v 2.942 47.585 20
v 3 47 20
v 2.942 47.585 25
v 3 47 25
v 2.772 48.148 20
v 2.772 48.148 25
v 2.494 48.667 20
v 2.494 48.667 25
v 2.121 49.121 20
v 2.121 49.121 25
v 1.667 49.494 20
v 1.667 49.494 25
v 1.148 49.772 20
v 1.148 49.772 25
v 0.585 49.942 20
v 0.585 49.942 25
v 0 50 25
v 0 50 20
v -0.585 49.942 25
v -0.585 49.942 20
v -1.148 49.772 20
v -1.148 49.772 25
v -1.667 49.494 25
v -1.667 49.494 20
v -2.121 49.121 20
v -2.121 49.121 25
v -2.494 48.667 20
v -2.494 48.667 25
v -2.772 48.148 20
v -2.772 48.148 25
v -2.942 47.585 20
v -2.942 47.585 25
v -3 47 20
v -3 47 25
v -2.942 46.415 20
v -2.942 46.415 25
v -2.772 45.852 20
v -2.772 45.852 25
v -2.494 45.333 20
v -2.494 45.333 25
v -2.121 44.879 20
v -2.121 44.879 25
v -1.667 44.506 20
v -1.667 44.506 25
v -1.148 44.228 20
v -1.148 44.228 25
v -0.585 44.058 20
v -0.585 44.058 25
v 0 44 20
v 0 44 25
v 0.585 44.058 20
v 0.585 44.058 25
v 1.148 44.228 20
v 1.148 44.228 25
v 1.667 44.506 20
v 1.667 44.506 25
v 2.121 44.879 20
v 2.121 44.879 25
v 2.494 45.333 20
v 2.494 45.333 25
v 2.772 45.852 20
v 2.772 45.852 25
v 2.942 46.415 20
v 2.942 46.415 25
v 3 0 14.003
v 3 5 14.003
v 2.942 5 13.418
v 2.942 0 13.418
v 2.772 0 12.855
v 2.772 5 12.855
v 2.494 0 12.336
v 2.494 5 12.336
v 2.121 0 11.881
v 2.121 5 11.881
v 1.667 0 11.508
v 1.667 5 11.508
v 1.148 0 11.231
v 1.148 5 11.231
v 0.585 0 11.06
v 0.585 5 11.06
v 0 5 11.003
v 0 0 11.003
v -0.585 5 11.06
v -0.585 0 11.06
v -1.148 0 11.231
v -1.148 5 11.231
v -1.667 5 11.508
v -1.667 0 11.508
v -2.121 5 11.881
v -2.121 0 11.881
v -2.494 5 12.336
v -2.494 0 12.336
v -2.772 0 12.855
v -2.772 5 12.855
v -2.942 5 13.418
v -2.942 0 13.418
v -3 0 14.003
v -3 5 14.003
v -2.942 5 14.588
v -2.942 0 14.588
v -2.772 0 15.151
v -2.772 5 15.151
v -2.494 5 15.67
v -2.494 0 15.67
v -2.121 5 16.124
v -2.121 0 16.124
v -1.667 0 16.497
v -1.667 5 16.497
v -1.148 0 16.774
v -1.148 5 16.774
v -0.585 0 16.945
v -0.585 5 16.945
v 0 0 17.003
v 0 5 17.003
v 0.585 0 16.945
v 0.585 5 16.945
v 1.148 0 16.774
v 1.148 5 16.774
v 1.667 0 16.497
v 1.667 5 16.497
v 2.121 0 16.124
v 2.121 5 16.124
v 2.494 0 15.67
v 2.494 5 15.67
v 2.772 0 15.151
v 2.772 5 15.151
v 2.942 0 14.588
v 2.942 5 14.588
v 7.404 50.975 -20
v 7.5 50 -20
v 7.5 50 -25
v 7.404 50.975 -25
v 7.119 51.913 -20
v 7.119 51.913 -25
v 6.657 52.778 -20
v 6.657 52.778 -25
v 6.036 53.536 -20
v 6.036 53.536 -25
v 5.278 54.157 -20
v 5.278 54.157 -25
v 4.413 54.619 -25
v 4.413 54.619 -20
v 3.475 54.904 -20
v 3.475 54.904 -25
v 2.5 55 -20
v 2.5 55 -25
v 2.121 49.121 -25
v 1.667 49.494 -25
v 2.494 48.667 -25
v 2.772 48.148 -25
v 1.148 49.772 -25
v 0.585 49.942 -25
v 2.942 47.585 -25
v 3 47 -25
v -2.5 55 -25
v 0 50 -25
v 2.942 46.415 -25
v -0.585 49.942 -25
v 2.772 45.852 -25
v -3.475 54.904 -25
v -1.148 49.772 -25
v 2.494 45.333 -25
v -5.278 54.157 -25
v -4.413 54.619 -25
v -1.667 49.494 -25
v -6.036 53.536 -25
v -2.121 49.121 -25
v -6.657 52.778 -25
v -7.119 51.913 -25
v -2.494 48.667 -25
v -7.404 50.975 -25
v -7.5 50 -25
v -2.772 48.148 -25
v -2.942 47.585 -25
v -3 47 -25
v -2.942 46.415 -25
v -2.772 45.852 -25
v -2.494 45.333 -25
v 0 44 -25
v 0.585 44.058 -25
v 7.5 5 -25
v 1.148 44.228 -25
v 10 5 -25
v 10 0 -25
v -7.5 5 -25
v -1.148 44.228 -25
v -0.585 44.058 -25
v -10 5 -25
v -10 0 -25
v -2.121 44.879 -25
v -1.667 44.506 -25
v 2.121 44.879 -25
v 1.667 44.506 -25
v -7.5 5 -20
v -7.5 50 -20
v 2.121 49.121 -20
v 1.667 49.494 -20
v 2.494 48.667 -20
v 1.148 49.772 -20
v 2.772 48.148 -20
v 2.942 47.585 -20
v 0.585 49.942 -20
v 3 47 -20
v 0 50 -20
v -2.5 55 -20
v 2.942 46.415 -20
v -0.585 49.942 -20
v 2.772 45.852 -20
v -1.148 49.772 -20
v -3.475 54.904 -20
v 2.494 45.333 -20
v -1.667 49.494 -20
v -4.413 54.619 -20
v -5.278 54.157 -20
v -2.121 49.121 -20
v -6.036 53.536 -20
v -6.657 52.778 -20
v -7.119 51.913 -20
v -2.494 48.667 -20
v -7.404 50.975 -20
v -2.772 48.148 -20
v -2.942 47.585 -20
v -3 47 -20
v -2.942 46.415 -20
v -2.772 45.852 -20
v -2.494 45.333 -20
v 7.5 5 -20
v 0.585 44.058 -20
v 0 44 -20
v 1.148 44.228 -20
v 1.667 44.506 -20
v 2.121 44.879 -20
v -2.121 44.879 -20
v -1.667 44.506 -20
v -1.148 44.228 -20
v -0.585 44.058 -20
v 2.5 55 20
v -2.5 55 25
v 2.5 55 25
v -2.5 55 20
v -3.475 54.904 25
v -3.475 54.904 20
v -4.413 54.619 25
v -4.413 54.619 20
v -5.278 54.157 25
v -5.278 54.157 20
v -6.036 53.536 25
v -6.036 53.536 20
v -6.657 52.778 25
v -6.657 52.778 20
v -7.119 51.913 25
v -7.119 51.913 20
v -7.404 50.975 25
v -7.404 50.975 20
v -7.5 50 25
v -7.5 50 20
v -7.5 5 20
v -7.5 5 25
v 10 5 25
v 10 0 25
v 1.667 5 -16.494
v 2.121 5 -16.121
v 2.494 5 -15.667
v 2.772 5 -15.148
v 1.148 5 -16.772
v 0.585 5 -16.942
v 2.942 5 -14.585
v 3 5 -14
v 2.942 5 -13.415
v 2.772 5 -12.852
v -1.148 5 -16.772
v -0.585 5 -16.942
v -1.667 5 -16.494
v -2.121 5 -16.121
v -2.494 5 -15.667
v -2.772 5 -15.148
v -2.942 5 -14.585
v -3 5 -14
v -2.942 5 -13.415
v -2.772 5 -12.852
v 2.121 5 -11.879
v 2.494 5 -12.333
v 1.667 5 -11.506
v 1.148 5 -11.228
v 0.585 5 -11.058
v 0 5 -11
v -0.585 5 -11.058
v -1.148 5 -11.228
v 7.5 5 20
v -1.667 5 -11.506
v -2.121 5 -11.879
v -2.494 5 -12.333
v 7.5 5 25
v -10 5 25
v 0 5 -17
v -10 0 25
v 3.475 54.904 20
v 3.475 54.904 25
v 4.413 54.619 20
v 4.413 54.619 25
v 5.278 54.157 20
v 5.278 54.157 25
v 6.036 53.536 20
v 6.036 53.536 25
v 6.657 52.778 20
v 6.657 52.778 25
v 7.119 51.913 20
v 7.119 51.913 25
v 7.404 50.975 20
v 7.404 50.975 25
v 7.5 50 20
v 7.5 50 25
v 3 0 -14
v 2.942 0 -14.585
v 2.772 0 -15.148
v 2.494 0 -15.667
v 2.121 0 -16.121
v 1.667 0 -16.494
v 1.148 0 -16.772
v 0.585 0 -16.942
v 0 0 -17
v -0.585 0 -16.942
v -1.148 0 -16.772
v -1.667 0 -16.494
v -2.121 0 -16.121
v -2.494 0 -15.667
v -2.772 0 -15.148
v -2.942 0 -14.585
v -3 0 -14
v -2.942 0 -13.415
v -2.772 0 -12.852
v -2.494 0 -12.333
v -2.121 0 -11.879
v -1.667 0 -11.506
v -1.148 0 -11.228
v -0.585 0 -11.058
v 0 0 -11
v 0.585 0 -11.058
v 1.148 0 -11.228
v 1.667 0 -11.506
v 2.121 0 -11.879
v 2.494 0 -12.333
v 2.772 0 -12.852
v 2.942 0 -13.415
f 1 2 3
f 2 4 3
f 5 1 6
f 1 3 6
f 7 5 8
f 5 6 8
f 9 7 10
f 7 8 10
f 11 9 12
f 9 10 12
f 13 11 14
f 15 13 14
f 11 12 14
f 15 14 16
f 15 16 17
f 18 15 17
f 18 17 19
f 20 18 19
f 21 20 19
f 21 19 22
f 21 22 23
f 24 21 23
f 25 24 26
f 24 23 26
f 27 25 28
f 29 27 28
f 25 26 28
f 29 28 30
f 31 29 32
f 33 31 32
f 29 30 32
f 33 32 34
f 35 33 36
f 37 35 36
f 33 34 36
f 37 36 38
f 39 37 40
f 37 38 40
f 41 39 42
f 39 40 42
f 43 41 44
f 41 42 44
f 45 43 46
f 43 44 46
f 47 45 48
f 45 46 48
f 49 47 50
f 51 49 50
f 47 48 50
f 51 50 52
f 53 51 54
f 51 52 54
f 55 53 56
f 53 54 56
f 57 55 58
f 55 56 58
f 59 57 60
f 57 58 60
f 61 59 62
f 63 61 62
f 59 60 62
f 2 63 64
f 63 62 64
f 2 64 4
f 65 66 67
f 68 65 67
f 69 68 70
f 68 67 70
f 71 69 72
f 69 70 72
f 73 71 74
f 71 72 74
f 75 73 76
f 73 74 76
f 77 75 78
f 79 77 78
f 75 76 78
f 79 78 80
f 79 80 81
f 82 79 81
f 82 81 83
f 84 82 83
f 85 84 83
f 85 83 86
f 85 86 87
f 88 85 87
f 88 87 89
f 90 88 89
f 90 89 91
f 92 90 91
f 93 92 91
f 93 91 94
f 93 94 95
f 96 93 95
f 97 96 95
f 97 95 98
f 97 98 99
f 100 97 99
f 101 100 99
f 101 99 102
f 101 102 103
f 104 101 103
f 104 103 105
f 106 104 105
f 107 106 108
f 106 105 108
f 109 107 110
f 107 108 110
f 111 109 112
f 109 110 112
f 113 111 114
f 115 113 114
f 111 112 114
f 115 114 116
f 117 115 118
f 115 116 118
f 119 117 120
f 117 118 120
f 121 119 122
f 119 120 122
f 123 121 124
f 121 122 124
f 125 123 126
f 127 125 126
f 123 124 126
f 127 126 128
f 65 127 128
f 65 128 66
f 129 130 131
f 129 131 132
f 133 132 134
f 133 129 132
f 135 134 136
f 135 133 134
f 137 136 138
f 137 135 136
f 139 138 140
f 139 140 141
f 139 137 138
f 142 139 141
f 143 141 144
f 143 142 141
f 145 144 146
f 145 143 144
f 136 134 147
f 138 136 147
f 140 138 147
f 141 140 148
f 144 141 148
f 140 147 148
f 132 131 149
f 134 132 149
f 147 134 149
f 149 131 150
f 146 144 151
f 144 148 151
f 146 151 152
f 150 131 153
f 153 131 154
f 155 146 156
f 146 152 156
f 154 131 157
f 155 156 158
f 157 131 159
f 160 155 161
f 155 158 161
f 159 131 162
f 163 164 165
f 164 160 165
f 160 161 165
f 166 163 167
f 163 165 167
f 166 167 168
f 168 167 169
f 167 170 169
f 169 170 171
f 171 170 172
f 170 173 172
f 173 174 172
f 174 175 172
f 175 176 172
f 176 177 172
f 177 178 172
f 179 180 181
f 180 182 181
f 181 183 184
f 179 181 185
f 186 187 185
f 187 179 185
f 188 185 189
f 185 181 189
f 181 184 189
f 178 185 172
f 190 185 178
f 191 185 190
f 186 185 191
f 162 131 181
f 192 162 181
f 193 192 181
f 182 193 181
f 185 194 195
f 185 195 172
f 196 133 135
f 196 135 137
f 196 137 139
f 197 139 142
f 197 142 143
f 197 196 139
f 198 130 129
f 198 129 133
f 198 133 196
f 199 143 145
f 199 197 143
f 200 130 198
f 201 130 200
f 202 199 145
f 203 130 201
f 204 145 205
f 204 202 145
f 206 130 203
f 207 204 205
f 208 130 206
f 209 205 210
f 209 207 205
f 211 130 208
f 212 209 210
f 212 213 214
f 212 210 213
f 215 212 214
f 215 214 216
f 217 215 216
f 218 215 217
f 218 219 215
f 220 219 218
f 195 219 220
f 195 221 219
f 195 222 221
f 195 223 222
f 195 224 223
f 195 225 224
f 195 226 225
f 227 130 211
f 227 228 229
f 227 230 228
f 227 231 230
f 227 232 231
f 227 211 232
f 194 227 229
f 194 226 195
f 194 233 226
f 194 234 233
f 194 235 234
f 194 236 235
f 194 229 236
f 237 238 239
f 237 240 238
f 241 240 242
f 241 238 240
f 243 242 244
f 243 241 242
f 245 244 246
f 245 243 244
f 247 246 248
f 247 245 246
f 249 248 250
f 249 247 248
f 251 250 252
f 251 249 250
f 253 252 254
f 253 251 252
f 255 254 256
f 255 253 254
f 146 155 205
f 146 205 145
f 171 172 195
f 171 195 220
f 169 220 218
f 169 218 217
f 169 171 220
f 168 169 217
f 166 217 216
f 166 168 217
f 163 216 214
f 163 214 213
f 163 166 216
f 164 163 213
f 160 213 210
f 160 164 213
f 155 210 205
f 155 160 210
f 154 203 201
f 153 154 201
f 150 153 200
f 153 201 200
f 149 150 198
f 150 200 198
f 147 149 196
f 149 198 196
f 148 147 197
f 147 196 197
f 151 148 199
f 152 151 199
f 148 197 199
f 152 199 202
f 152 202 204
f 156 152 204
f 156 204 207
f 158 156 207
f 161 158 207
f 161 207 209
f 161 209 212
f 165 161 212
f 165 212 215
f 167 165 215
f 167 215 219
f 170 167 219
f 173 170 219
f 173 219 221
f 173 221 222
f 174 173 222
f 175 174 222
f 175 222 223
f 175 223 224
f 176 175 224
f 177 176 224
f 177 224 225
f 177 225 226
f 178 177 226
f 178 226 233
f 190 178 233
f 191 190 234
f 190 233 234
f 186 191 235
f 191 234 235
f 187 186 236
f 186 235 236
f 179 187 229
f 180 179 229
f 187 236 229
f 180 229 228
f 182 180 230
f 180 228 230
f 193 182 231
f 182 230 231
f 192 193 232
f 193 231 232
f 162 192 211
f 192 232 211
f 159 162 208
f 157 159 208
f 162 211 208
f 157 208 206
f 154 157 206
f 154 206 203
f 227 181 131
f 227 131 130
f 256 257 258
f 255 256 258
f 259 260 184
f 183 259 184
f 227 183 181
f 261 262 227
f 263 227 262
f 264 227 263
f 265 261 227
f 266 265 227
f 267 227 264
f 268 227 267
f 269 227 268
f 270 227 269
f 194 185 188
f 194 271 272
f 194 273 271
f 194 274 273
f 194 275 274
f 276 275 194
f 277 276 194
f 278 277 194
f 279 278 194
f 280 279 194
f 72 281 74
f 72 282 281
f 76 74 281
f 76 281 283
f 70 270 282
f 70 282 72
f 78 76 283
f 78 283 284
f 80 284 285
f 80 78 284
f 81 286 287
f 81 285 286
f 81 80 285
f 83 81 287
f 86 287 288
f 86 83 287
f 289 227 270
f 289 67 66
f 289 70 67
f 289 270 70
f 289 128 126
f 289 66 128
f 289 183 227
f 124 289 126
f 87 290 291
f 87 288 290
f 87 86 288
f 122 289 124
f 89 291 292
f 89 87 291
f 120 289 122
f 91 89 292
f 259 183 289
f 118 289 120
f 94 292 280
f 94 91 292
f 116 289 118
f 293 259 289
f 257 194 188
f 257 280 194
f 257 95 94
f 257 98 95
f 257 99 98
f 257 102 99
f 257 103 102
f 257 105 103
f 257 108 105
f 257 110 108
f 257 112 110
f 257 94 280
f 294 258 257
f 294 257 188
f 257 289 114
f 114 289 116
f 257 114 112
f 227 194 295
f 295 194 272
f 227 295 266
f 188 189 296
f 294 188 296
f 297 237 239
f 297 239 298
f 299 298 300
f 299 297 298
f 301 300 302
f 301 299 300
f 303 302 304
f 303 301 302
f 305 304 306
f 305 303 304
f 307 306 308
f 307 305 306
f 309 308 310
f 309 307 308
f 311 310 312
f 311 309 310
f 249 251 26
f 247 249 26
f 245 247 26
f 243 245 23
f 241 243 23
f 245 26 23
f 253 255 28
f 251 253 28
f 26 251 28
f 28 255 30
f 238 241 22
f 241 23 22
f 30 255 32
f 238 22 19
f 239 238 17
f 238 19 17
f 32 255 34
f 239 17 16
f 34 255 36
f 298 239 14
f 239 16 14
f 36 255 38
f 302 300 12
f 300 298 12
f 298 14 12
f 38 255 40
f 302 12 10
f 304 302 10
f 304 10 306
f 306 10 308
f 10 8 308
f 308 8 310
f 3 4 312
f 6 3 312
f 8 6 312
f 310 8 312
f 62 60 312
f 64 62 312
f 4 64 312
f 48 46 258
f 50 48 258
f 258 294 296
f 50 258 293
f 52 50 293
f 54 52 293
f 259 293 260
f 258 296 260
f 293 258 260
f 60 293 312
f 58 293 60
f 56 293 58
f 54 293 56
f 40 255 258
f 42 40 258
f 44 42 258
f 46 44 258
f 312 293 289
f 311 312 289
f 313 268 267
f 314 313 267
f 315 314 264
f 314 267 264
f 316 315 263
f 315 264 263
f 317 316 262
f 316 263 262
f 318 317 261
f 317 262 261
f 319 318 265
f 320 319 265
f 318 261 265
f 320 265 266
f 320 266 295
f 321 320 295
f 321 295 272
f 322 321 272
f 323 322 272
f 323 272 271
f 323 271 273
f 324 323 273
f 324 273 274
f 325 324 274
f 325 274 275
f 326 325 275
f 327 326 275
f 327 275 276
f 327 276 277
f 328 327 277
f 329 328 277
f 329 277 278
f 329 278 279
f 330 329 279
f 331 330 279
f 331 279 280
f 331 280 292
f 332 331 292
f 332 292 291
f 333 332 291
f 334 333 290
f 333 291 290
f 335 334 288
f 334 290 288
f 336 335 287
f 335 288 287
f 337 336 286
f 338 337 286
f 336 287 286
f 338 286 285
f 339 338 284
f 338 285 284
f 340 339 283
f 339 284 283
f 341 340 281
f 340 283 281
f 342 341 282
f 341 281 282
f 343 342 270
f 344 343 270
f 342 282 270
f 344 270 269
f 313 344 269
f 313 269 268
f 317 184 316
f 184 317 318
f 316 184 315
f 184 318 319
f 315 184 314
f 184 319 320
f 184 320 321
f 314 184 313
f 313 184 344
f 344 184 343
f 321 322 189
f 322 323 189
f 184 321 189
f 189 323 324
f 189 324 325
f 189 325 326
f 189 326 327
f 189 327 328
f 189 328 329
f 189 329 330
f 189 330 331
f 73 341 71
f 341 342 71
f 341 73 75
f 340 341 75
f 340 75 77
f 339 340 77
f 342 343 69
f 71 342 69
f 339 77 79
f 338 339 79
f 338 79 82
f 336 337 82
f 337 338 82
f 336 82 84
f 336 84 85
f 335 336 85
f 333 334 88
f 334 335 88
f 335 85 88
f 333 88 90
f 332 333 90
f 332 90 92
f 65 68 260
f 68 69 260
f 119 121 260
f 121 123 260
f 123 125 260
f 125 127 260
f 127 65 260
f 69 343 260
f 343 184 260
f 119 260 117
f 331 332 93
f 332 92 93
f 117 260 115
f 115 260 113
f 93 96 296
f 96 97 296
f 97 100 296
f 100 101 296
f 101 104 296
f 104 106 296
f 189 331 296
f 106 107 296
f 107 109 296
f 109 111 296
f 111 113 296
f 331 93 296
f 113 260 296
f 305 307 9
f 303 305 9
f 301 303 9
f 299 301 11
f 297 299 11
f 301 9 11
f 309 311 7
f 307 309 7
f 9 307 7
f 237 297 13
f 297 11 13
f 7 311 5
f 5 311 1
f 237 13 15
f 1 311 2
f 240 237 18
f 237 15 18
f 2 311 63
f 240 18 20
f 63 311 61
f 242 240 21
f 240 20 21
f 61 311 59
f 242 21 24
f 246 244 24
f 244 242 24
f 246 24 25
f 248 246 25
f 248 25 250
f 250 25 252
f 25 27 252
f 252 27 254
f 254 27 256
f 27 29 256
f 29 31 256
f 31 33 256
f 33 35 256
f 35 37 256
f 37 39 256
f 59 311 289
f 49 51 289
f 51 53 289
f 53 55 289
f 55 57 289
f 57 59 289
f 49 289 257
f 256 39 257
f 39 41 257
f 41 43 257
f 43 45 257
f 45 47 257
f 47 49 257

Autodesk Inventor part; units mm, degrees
ref_plane "YZ Plane" through (0, 0, 0) normal (1, 0, 0) x (0, 1, 0)
ref_plane "XZ Plane" through (0, 0, 0) normal (0, 1, 0) x (-1, 0, 0)
ref_plane "XY Plane" through (0, 0, 0) normal (0, 0, 1) x (1, 0, 0)
sketch "Sketch1" plane through (0, 0, 0) normal (0, 1, 0) x (-1, 0, 0)
  line L0 (10, 25) -> (-10, 25)
  line L1 (-10, 25) -> (-10, -25)
  line L2 (-10, -25) -> (10, -25)
  line L3 (10, -25) -> (10, 25)
  point P0 (0, 0)
  dimension "d0" = 50
  dimension "d1" = 20
  dimension "d2" = 25
  dimension "d3" = 10
extrude "Extrusion1" add sketch "Sketch1" along normal blind 5
sketch "Sketch2" plane through (0, 5, 0) normal (0, 1, 0) x (1, 0, 0)
  line L0 (-10, -25) -> (10, -25) projected
  line L1 (-7.5, -25) -> (7.5, -25)
  line L2 (7.5, -25) -> (7.5, -20)
  line L3 (7.5, -20) -> (-7.5, -20)
  line L4 (-7.5, -20) -> (-7.5, -25)
  line L5 (-10, 25) -> (-10, -25) projected
  line L6 (10, 25) -> (-10, 25) projected
  line L7 (-7.5, 25) -> (7.5, 25)
  line L8 (7.5, 25) -> (7.5, 20)
  line L9 (7.5, 20) -> (-7.5, 20)
  line L10 (-7.5, 20) -> (-7.5, 25)
  point P0 (0, 0)
  dimension "d6" = 15
  dimension "d7" = 5
  dimension "d8" = 2.5
  dimension "d9" = 5
extrude "Extrusion2" add sketch "Sketch2" along normal blind 50
fillet "Fillet1" radius 5 4 edges at (7.5, 55, 22.5) (7.5, 55, -22.5) (-7.5, 55, 22.5) (-7.5, 55, -22.5)
sketch "Sketch3" plane through (-10, 0, 25) normal (0, 0, 1) x (1, 0, 0)
  line L0 (7.5, 55) -> (12.5, 55) projected
  circle A0 centre (10, 47) radius 3
  point P0 (10, 0)
  point P1 (10, 55)
  dimension "d13" = 6
  dimension "d14" = 8
extrude "Extrusion3" cut sketch "Sketch3" against normal through all
sketch "Sketch4" plane through (0, 5, 0) normal (0, 1, 0) x (1, 0, 0)
  line L0 (2.5, -20) -> (-2.5, -20) projected
  line L1 (-2.5, 20) -> (2.5, 20) projected
  circle A0 centre (0, -14.0028) radius 3
  circle A1 centre (0, 14) radius 3
  point P0 (0, 0)
  point P1 (0, -20)
  dimension "d17" = 6
  dimension "d18" = 6
  dimension "d19" = 5.9972
  dimension "d20" = 6
extrude "Extrusion4" cut sketch "Sketch4" against normal blind 10
equation "\"d2\" = 0.5 * d0"
equation "\"d3\" = 0.5 * d1"
properties part number "sensor_cover_ultrasonic_3"
